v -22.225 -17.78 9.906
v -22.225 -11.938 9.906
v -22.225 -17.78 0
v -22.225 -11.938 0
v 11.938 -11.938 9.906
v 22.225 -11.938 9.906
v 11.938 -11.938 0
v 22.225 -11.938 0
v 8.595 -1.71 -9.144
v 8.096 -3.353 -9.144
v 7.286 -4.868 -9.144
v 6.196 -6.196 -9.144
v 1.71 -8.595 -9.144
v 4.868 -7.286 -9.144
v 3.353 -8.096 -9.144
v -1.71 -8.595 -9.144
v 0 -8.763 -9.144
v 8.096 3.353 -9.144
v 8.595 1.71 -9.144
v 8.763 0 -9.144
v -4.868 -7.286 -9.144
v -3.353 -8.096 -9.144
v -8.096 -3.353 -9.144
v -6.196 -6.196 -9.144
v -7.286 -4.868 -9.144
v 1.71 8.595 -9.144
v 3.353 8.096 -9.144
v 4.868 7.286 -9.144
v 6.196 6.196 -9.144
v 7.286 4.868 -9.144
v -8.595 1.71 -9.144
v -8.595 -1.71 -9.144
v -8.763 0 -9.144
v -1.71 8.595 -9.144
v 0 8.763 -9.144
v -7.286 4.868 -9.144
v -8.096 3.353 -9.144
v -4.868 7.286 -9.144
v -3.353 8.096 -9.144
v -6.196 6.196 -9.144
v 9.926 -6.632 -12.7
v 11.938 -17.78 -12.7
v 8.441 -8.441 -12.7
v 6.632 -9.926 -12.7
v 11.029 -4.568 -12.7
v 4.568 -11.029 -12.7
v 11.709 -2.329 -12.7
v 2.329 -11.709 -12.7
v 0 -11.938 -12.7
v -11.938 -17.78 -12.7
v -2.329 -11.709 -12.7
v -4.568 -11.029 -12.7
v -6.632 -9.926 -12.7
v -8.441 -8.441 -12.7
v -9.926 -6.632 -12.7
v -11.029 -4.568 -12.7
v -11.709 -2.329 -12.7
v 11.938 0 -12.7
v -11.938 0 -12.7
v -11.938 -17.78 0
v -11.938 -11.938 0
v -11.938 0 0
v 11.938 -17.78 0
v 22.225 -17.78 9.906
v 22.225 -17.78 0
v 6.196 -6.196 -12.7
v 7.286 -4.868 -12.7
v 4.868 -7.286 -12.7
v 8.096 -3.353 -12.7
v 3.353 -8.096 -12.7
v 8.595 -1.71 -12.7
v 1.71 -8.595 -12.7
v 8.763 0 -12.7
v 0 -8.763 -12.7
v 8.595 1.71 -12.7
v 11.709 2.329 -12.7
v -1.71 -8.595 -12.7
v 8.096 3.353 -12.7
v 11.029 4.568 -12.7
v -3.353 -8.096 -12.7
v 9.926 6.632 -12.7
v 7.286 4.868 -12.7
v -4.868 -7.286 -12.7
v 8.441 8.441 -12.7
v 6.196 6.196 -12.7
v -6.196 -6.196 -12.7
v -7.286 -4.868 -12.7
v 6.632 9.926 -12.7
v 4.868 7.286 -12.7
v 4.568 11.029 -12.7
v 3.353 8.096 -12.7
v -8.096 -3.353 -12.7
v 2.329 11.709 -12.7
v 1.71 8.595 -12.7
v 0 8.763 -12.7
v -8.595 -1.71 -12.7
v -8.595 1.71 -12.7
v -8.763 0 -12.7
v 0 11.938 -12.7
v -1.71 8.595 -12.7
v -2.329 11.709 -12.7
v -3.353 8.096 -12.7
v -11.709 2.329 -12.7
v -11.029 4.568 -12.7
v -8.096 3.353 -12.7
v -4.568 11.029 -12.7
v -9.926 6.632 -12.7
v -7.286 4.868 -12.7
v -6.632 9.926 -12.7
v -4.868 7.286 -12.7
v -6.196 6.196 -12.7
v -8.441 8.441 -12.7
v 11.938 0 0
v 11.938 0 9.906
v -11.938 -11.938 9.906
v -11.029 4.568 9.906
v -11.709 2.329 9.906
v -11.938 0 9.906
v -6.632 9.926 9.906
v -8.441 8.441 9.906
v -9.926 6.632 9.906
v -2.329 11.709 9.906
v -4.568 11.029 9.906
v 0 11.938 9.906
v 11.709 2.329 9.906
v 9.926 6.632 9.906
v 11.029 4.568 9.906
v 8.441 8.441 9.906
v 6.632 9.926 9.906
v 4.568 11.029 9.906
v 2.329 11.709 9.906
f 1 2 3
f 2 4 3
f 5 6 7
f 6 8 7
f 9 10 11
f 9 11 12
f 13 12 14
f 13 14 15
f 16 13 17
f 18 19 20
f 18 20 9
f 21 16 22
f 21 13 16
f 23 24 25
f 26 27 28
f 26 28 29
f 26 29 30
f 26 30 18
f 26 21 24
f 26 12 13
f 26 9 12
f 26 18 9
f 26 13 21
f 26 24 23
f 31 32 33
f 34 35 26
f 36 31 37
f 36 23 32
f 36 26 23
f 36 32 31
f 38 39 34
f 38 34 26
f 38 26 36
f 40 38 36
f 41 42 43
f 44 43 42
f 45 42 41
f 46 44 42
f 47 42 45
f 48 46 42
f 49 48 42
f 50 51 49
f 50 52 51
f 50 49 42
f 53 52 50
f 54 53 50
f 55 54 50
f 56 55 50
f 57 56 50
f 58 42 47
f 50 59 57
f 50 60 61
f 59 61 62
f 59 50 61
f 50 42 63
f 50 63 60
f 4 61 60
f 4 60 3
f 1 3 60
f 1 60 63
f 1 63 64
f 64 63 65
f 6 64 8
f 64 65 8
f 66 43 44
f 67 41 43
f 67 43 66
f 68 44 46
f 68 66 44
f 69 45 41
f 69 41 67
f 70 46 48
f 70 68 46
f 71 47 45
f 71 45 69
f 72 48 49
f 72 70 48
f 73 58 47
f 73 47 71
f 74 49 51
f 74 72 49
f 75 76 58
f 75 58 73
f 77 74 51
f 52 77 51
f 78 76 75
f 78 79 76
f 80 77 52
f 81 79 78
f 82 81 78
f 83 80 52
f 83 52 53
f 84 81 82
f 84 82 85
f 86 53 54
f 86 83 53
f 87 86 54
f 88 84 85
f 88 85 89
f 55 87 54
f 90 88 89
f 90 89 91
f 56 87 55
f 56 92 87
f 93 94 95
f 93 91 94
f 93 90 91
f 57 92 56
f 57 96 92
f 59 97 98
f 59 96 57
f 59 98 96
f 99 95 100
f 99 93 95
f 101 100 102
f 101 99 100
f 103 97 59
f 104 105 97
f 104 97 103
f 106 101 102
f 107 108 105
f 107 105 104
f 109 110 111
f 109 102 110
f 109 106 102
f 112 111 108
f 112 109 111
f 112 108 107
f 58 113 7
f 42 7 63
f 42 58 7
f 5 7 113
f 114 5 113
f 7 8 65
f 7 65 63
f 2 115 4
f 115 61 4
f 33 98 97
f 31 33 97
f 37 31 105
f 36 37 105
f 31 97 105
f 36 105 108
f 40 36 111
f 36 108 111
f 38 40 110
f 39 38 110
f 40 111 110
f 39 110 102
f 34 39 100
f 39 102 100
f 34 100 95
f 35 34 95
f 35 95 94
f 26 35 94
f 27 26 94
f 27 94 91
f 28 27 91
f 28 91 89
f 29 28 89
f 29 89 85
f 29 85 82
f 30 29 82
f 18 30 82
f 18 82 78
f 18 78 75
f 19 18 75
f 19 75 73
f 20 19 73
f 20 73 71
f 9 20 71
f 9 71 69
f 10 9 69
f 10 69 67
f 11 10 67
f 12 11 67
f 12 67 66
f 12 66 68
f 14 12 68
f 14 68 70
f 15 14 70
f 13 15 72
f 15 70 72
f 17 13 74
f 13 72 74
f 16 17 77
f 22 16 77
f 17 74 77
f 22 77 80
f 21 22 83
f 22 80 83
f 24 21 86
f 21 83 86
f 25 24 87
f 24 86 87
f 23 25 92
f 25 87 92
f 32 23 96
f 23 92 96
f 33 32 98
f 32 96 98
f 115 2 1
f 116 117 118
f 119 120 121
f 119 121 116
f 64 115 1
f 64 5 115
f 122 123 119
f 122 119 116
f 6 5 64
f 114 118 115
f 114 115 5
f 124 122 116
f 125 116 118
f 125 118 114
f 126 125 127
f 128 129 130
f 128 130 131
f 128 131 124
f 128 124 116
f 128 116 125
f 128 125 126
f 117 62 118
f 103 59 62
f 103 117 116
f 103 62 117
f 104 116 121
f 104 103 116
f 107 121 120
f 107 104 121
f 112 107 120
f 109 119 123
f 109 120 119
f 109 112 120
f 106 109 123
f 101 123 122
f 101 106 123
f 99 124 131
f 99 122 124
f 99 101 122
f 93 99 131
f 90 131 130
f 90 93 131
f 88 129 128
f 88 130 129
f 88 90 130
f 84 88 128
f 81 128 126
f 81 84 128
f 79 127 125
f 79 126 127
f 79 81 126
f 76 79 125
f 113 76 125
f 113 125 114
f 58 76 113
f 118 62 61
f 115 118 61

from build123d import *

# Parameters (mm, degrees)
SKETCH1_R           = 8.763
BOSS_EXTRUDE1_DEPTH = 3.556
BOSS_EXTRUDE2_DEPTH = 6.35
BOSS_EXTRUDE3_START = 12.7
SKETCH3_R           = 11.938
SKETCH3_R_2         = 8.763
BOSS_EXTRUDE3_DEPTH = 12.7
BOSS_EXTRUDE4_START = 12.7
SKETCH4_R           = 8.763
BOSS_EXTRUDE4_DEPTH = 12.7
BOSS_EXTRUDE5_START = 12.7
BOSS_EXTRUDE5_DEPTH = 12.7


with BuildPart() as part:
    # Sketch1 → Boss-Extrude1 (new body)
    with BuildSketch(Plane.XY):
        with BuildLine():
            Line((11.938, 0), (11.938, -11.938))
            Line((11.938, -11.938), (22.225, -11.938))
            Line((22.225, -11.938), (22.225, -17.78))
            Line((22.225, -17.78), (-22.225, -17.78))
            Line((-22.225, -17.78), (-22.225, -11.938))
            Line((-22.225, -11.938), (-11.938, -11.938))
            Line((-11.938, -11.938), (-11.938, 0))
            ThreePointArc((-11.938, 0), (0, 11.938), (11.938, 0))
        make_face()
        Circle(SKETCH1_R, mode=Mode.SUBTRACT)
    extrude(amount=BOSS_EXTRUDE1_DEPTH)

    # Sketch2 → Boss-Extrude2 (add)
    with BuildSketch(Plane.XY.offset(3.556)):
        with BuildLine():
            Line((-11.938, 0), (-11.938, -11.938))
            Line((-11.938, -11.938), (-22.225, -11.938))
            Line((-22.225, -11.938), (-22.225, -17.78))
            Line((-22.225, -17.78), (22.225, -17.78))
            Line((22.225, -17.78), (22.225, -11.938))
            Line((22.225, -11.938), (11.938, -11.938))
            Line((11.938, -11.938), (11.938, 0))
            ThreePointArc((11.938, 0), (0, 11.938), (-11.938, 0))
        make_face()
    extrude(amount=BOSS_EXTRUDE2_DEPTH)

    # Sketch3 → Boss-Extrude3 (add)
    with BuildSketch(Plane(origin=(0, 0, 0), x_dir=(-1, 0, 0), z_dir=(0, 0, -1)).offset(BOSS_EXTRUDE3_START)):
        Circle(SKETCH3_R)
        Circle(SKETCH3_R_2, mode=Mode.SUBTRACT)
    extrude(amount=-BOSS_EXTRUDE3_DEPTH)

    # Sketch4 → Boss-Extrude4 (add)
    with BuildSketch(Plane(origin=(0, 0, 3.556), x_dir=(-1, 0, 0), z_dir=(0, 0, -1)).offset(BOSS_EXTRUDE4_START)):
        Circle(SKETCH4_R)
    extrude(amount=-BOSS_EXTRUDE4_DEPTH)

    # Sketch5 → Boss-Extrude5 (add)
    with BuildSketch(Plane(origin=(0, 0, 0), x_dir=(-1, 0, 0), z_dir=(0, 0, -1)).offset(BOSS_EXTRUDE5_START)):
        with BuildLine():
            Line((-11.938, 0), (-11.938, -17.78))
            Line((-11.938, -17.78), (11.938, -17.78))
            Line((11.938, -17.78), (11.938, 0))
            ThreePointArc((11.938, 0), (0, -11.938), (-11.938, 0))
        make_face()
    extrude(amount=-BOSS_EXTRUDE5_DEPTH)


solid = part.part
